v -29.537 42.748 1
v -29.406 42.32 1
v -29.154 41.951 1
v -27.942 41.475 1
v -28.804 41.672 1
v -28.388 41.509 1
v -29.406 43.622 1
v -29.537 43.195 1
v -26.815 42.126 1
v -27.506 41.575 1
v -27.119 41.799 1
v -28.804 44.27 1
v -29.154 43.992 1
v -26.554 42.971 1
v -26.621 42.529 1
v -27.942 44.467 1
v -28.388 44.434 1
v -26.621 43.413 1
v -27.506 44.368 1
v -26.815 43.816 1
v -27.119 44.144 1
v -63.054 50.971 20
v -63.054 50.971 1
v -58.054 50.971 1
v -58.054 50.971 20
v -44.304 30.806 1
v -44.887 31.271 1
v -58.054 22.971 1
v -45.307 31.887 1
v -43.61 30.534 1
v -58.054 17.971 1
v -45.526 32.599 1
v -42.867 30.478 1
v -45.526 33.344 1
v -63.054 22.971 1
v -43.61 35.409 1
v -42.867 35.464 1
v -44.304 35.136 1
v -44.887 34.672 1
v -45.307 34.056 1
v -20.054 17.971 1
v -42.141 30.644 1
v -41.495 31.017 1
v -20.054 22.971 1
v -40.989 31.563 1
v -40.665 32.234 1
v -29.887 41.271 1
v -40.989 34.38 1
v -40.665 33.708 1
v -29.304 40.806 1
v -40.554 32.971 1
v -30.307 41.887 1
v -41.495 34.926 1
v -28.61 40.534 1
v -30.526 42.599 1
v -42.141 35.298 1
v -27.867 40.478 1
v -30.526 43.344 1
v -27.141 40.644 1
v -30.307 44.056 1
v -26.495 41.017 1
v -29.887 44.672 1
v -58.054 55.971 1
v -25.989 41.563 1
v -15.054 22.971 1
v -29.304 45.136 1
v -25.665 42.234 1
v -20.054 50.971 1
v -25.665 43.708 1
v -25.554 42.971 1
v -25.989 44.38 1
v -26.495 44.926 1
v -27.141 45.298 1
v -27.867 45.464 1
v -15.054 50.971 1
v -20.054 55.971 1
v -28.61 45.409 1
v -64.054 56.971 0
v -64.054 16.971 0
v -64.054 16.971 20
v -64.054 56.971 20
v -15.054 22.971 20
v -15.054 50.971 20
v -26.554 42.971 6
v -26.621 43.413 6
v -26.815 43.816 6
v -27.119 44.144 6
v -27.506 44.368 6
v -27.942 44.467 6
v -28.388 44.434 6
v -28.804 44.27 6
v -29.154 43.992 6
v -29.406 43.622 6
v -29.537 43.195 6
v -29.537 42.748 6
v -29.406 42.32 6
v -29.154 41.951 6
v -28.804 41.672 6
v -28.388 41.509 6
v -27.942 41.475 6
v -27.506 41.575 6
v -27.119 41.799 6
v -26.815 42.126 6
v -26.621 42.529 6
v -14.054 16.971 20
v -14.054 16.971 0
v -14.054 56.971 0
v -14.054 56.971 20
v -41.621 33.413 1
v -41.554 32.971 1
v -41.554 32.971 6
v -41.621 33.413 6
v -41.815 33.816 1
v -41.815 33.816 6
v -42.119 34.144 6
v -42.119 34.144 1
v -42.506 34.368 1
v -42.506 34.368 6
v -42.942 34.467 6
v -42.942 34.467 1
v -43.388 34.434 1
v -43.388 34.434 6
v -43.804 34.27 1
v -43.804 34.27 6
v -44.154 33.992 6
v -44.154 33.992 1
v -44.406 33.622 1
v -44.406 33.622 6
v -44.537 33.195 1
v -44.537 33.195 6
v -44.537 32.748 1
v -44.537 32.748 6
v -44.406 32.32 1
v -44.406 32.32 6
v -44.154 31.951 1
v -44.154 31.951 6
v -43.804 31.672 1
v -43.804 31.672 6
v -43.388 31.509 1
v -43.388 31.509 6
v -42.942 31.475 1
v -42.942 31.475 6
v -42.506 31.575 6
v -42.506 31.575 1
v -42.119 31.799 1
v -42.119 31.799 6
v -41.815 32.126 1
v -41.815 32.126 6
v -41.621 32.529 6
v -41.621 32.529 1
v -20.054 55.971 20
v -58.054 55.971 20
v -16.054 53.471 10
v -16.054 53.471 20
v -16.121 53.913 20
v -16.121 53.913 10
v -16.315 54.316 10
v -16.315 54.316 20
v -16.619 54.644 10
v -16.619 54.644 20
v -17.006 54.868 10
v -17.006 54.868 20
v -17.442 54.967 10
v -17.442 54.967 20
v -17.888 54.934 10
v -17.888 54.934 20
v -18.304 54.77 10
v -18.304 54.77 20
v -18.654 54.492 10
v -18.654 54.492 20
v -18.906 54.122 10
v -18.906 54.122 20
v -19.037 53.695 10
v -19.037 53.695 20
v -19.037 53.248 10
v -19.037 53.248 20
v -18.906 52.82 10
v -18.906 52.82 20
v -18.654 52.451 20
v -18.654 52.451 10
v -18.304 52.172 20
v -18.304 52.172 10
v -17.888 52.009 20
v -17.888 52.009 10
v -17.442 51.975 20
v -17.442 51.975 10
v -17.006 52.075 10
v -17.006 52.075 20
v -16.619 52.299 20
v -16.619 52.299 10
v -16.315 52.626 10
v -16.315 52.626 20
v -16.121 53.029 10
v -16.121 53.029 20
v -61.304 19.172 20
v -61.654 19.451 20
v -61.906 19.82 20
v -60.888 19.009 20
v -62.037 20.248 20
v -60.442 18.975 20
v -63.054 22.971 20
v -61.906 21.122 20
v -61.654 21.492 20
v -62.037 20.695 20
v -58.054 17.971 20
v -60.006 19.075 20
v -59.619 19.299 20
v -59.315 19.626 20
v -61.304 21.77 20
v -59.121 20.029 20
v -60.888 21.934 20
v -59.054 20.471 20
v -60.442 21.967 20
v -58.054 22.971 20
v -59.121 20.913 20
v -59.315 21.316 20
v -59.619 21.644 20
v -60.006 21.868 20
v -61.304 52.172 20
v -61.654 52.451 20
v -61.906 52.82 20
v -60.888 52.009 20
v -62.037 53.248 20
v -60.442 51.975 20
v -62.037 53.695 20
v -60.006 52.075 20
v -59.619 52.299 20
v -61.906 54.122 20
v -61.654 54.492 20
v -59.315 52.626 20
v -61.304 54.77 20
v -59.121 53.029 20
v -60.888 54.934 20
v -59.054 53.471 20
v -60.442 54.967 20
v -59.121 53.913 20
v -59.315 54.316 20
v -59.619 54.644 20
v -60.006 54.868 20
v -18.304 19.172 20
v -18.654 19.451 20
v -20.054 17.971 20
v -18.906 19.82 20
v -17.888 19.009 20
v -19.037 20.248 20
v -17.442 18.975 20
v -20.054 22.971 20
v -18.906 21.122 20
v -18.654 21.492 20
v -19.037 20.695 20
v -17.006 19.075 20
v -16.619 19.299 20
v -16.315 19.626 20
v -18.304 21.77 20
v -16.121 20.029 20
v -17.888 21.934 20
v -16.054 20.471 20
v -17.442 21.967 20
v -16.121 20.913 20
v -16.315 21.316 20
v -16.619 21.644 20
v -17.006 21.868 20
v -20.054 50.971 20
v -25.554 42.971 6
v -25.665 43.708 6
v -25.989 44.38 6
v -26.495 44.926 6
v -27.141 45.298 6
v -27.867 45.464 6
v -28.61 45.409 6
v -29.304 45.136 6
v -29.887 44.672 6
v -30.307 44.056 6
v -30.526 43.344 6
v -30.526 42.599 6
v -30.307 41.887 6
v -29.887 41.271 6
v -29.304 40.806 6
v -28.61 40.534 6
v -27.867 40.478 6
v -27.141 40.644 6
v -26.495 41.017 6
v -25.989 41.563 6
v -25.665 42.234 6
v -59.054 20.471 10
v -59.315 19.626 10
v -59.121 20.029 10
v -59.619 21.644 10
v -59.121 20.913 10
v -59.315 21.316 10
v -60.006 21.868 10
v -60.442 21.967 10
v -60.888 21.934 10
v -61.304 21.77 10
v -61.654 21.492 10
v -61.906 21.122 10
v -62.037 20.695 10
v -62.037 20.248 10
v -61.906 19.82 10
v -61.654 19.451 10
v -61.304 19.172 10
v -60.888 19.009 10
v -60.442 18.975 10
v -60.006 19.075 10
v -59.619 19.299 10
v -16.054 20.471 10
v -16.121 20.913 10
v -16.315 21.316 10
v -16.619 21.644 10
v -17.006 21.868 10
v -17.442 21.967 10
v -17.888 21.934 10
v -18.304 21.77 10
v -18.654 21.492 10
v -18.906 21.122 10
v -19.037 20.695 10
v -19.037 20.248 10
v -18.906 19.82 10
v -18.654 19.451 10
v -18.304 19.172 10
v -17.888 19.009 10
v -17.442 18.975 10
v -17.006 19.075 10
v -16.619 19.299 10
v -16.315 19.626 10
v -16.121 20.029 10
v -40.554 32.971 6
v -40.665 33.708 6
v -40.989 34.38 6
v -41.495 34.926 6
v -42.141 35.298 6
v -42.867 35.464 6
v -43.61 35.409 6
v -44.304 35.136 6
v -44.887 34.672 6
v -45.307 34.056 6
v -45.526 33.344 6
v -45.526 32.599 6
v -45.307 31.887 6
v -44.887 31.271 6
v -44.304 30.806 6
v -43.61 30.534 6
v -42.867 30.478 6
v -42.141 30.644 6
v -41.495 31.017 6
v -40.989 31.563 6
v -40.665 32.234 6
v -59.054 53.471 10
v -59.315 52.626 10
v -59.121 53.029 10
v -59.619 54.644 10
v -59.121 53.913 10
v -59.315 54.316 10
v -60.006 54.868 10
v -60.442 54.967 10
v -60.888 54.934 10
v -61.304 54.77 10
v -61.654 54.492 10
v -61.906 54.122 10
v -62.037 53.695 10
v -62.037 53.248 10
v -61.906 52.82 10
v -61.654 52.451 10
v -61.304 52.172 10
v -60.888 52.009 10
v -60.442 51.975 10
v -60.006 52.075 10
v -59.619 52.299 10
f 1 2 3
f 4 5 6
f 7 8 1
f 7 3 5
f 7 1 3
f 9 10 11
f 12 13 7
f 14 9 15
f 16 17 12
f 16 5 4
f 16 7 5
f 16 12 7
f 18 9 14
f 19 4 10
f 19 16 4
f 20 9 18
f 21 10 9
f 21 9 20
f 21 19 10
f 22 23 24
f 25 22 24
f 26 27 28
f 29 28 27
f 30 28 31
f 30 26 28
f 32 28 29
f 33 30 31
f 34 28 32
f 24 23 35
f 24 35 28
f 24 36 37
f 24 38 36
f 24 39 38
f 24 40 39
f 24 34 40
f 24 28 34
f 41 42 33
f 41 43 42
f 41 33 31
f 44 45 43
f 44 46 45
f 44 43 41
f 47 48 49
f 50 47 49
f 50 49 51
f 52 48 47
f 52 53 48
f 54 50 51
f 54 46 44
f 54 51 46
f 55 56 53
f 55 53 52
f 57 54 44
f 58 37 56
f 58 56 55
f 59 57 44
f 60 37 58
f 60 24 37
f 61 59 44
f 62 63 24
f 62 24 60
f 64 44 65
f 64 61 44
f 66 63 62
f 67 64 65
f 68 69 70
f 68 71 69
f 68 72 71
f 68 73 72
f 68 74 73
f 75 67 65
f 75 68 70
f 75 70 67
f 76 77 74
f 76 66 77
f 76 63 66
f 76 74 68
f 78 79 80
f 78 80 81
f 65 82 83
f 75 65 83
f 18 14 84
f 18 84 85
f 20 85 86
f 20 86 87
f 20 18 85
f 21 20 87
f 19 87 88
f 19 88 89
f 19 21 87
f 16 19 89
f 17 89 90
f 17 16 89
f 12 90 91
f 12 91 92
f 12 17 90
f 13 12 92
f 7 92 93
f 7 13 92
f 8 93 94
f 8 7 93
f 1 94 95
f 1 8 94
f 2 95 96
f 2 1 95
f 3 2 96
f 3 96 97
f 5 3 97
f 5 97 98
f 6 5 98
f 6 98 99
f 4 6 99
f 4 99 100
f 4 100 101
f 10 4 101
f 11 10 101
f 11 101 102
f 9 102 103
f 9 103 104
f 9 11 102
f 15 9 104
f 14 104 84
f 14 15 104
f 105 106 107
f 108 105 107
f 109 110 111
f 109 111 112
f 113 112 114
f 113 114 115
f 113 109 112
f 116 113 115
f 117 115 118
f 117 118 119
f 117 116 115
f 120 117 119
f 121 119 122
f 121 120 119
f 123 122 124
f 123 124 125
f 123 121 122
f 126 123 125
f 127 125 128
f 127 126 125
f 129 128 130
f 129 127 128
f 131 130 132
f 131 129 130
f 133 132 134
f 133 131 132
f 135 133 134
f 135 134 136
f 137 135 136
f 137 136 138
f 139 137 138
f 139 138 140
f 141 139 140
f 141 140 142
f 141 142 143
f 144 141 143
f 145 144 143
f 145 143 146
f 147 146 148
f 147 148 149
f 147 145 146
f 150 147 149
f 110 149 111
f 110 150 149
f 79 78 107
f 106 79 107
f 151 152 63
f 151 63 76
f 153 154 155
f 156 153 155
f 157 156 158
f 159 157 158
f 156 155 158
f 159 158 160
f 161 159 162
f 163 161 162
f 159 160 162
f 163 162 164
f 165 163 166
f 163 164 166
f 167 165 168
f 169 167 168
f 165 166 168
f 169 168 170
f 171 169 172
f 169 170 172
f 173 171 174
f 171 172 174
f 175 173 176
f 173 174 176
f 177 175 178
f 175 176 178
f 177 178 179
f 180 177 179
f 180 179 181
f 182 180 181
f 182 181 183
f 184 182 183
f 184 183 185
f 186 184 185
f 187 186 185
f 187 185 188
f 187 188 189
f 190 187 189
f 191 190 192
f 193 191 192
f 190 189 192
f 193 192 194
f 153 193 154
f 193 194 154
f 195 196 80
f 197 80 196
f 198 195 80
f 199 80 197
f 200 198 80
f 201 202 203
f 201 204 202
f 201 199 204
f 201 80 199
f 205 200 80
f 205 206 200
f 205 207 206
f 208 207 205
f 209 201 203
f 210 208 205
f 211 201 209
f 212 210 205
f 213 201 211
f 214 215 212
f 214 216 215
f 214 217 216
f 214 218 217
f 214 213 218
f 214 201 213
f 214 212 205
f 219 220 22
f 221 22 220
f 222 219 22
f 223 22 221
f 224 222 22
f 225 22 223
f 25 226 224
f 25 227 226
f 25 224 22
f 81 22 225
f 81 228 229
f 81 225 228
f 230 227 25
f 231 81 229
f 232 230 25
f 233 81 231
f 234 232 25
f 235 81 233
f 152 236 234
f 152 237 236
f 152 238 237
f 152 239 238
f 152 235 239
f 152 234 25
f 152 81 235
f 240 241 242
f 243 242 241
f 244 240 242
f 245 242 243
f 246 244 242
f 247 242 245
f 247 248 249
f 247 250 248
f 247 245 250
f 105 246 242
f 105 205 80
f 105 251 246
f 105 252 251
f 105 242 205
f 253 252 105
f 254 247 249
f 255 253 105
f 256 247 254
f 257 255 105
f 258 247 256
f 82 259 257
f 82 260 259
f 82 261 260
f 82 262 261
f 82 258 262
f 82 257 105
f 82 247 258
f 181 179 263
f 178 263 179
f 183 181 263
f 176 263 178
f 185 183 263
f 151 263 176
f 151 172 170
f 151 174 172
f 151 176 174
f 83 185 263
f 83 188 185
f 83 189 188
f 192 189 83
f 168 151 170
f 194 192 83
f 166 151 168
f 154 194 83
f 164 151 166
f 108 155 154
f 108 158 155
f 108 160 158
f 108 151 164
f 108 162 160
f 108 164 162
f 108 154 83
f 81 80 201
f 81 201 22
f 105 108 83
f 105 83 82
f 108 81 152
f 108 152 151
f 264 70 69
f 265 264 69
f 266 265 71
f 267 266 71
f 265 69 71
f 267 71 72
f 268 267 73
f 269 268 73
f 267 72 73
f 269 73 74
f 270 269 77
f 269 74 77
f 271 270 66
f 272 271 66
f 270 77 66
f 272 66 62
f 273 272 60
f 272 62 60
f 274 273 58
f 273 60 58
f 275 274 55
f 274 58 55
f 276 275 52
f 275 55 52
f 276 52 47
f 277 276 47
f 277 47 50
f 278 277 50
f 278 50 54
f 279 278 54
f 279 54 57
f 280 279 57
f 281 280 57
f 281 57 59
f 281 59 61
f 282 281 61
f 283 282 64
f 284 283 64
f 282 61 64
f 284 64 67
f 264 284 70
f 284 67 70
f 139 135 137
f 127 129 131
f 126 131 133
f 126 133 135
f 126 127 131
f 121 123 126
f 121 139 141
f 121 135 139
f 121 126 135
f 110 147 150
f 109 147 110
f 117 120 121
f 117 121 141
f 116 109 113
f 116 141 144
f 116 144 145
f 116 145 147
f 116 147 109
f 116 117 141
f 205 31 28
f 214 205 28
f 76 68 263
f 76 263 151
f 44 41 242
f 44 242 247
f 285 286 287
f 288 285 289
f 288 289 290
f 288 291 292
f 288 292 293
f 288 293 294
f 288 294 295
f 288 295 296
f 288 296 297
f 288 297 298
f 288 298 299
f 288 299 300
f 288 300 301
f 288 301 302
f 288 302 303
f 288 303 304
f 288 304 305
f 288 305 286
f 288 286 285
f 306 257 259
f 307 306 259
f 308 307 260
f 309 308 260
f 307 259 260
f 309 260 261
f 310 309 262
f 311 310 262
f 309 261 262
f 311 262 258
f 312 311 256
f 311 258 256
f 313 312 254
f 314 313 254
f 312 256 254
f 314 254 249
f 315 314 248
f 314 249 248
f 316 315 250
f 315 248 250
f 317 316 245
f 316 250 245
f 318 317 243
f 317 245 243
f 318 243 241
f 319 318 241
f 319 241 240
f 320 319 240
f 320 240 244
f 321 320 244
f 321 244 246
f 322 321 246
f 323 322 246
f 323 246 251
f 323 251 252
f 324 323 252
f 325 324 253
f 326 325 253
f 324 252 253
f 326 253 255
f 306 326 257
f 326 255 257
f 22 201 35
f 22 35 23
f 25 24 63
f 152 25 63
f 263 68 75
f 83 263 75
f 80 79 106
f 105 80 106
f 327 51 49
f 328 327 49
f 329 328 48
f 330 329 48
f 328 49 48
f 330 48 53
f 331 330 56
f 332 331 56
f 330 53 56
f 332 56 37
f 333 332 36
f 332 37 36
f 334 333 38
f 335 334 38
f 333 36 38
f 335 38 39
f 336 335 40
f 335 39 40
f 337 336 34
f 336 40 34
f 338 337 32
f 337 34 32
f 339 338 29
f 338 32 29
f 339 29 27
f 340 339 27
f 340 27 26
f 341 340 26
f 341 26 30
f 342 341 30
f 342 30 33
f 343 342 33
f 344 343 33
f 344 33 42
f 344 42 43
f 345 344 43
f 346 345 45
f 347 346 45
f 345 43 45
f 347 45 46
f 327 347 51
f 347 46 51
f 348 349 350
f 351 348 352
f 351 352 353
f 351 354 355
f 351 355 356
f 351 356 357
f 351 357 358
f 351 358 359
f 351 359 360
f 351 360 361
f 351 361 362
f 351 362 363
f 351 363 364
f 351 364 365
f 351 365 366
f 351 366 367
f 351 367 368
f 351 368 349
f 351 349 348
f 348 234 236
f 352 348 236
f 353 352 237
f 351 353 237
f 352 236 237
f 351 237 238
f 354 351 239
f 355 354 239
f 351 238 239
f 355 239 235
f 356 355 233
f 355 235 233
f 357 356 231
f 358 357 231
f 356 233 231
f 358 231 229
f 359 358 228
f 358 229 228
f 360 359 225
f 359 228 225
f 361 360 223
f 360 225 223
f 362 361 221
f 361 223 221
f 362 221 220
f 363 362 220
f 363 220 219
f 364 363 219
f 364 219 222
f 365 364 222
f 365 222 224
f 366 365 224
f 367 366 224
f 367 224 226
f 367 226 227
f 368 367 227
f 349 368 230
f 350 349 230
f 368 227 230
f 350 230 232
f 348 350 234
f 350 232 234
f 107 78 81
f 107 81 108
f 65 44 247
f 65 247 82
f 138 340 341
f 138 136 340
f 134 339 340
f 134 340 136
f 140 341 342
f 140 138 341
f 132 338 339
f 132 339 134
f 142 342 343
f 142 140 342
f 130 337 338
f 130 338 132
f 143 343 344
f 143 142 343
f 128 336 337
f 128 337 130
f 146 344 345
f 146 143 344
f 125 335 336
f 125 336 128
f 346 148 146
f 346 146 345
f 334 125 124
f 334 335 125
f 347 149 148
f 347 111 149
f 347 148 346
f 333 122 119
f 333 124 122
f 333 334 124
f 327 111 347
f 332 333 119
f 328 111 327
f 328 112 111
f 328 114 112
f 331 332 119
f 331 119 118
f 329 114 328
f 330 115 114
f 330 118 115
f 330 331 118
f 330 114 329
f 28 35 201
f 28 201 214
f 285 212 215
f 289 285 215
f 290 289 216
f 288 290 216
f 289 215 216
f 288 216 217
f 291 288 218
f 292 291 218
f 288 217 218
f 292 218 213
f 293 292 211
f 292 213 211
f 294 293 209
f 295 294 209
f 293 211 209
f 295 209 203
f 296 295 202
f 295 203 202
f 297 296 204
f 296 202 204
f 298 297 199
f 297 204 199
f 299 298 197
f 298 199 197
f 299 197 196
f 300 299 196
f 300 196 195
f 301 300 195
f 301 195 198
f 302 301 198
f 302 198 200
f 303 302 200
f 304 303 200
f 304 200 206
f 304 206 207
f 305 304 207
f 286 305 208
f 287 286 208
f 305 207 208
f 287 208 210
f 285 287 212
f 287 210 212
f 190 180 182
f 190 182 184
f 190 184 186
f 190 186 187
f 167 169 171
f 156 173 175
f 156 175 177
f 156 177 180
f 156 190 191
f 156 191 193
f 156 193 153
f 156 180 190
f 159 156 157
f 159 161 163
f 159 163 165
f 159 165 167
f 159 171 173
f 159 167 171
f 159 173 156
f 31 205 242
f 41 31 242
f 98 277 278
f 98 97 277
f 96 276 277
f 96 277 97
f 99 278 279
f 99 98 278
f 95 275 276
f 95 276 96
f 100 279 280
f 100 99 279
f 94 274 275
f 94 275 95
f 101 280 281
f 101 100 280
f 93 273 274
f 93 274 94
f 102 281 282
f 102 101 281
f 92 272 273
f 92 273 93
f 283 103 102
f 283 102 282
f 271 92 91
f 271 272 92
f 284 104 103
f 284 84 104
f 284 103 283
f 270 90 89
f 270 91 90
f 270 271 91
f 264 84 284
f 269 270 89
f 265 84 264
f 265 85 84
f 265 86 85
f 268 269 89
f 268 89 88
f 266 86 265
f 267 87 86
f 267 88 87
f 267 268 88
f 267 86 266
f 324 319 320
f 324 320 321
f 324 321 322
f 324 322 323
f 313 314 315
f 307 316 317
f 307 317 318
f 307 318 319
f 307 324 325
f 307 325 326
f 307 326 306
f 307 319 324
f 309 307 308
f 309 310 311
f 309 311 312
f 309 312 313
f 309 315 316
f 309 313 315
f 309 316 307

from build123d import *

# Parameters (mm, degrees)
F0_W      = 50
F0_H      = 40
F1_DEPTH  = 20
F2_W      = 48
F2_H      = 38
F3_DEPTH  = 19
F4_W      = 5
F4_H      = 5
F5_DEPTH  = 19
F6_R      = 1.5
F7_DEPTH  = 10
F9_R      = 2.5
F9_R_2    = 1.5
F10_DEPTH = 5


with BuildPart() as f1:
    # F0 (on Top) → F1 (new body)
    with BuildSketch(Plane.XY):
        with Locations((-39.054142, 36.971296)):
            Rectangle(F0_W, F0_H)
    extrude(amount=F1_DEPTH)

    # F2 (on face) → F3 (cut)
    with BuildSketch(Plane.XY.offset(20)):
        with Locations((-39.054142, 36.971296)):
            Rectangle(F2_W, F2_H)
    extrude(amount=-F3_DEPTH, mode=Mode.SUBTRACT)

    # F4 (on face) → F5 (join)
    with BuildSketch(Plane.XY.offset(1)):
        with Locations((-60.554142, 53.471296)):
            Rectangle(F4_W, F4_H)
        with Locations((-60.554142, 20.471296)):
            Rectangle(F4_W, F4_H)
        with Locations((-17.554142, 53.471296)):
            Rectangle(F4_W, F4_H)
        with Locations((-17.554142, 20.471296)):
            Rectangle(F4_W, F4_H)
    extrude(amount=F5_DEPTH)

    # F6 (on face) → F7 (cut)
    with BuildSketch(Plane.XY.offset(20)):
        with Locations((-60.554142, 53.471296)):
            Circle(F6_R)
        with Locations((-60.554142, 20.471296)):
            Circle(F6_R)
        with Locations((-17.554142, 20.471296)):
            Circle(F6_R)
        with Locations((-17.554142, 53.471296)):
            Circle(F6_R)
    extrude(amount=-F7_DEPTH, mode=Mode.SUBTRACT)

    # F9 (on face) → F10 (join)
    with BuildSketch(Plane.XY.offset(1)):
        with Locations((-43.054142, 32.971296)):
            Circle(F9_R)
        with Locations((-43.054142, 32.971296)):
            Circle(F9_R_2, mode=Mode.SUBTRACT)
        with Locations((-28.054142, 42.971296)):
            Circle(F9_R)
        with Locations((-28.054142, 42.971296)):
            Circle(F9_R_2, mode=Mode.SUBTRACT)
    extrude(amount=F10_DEPTH)


solid = f1.part
